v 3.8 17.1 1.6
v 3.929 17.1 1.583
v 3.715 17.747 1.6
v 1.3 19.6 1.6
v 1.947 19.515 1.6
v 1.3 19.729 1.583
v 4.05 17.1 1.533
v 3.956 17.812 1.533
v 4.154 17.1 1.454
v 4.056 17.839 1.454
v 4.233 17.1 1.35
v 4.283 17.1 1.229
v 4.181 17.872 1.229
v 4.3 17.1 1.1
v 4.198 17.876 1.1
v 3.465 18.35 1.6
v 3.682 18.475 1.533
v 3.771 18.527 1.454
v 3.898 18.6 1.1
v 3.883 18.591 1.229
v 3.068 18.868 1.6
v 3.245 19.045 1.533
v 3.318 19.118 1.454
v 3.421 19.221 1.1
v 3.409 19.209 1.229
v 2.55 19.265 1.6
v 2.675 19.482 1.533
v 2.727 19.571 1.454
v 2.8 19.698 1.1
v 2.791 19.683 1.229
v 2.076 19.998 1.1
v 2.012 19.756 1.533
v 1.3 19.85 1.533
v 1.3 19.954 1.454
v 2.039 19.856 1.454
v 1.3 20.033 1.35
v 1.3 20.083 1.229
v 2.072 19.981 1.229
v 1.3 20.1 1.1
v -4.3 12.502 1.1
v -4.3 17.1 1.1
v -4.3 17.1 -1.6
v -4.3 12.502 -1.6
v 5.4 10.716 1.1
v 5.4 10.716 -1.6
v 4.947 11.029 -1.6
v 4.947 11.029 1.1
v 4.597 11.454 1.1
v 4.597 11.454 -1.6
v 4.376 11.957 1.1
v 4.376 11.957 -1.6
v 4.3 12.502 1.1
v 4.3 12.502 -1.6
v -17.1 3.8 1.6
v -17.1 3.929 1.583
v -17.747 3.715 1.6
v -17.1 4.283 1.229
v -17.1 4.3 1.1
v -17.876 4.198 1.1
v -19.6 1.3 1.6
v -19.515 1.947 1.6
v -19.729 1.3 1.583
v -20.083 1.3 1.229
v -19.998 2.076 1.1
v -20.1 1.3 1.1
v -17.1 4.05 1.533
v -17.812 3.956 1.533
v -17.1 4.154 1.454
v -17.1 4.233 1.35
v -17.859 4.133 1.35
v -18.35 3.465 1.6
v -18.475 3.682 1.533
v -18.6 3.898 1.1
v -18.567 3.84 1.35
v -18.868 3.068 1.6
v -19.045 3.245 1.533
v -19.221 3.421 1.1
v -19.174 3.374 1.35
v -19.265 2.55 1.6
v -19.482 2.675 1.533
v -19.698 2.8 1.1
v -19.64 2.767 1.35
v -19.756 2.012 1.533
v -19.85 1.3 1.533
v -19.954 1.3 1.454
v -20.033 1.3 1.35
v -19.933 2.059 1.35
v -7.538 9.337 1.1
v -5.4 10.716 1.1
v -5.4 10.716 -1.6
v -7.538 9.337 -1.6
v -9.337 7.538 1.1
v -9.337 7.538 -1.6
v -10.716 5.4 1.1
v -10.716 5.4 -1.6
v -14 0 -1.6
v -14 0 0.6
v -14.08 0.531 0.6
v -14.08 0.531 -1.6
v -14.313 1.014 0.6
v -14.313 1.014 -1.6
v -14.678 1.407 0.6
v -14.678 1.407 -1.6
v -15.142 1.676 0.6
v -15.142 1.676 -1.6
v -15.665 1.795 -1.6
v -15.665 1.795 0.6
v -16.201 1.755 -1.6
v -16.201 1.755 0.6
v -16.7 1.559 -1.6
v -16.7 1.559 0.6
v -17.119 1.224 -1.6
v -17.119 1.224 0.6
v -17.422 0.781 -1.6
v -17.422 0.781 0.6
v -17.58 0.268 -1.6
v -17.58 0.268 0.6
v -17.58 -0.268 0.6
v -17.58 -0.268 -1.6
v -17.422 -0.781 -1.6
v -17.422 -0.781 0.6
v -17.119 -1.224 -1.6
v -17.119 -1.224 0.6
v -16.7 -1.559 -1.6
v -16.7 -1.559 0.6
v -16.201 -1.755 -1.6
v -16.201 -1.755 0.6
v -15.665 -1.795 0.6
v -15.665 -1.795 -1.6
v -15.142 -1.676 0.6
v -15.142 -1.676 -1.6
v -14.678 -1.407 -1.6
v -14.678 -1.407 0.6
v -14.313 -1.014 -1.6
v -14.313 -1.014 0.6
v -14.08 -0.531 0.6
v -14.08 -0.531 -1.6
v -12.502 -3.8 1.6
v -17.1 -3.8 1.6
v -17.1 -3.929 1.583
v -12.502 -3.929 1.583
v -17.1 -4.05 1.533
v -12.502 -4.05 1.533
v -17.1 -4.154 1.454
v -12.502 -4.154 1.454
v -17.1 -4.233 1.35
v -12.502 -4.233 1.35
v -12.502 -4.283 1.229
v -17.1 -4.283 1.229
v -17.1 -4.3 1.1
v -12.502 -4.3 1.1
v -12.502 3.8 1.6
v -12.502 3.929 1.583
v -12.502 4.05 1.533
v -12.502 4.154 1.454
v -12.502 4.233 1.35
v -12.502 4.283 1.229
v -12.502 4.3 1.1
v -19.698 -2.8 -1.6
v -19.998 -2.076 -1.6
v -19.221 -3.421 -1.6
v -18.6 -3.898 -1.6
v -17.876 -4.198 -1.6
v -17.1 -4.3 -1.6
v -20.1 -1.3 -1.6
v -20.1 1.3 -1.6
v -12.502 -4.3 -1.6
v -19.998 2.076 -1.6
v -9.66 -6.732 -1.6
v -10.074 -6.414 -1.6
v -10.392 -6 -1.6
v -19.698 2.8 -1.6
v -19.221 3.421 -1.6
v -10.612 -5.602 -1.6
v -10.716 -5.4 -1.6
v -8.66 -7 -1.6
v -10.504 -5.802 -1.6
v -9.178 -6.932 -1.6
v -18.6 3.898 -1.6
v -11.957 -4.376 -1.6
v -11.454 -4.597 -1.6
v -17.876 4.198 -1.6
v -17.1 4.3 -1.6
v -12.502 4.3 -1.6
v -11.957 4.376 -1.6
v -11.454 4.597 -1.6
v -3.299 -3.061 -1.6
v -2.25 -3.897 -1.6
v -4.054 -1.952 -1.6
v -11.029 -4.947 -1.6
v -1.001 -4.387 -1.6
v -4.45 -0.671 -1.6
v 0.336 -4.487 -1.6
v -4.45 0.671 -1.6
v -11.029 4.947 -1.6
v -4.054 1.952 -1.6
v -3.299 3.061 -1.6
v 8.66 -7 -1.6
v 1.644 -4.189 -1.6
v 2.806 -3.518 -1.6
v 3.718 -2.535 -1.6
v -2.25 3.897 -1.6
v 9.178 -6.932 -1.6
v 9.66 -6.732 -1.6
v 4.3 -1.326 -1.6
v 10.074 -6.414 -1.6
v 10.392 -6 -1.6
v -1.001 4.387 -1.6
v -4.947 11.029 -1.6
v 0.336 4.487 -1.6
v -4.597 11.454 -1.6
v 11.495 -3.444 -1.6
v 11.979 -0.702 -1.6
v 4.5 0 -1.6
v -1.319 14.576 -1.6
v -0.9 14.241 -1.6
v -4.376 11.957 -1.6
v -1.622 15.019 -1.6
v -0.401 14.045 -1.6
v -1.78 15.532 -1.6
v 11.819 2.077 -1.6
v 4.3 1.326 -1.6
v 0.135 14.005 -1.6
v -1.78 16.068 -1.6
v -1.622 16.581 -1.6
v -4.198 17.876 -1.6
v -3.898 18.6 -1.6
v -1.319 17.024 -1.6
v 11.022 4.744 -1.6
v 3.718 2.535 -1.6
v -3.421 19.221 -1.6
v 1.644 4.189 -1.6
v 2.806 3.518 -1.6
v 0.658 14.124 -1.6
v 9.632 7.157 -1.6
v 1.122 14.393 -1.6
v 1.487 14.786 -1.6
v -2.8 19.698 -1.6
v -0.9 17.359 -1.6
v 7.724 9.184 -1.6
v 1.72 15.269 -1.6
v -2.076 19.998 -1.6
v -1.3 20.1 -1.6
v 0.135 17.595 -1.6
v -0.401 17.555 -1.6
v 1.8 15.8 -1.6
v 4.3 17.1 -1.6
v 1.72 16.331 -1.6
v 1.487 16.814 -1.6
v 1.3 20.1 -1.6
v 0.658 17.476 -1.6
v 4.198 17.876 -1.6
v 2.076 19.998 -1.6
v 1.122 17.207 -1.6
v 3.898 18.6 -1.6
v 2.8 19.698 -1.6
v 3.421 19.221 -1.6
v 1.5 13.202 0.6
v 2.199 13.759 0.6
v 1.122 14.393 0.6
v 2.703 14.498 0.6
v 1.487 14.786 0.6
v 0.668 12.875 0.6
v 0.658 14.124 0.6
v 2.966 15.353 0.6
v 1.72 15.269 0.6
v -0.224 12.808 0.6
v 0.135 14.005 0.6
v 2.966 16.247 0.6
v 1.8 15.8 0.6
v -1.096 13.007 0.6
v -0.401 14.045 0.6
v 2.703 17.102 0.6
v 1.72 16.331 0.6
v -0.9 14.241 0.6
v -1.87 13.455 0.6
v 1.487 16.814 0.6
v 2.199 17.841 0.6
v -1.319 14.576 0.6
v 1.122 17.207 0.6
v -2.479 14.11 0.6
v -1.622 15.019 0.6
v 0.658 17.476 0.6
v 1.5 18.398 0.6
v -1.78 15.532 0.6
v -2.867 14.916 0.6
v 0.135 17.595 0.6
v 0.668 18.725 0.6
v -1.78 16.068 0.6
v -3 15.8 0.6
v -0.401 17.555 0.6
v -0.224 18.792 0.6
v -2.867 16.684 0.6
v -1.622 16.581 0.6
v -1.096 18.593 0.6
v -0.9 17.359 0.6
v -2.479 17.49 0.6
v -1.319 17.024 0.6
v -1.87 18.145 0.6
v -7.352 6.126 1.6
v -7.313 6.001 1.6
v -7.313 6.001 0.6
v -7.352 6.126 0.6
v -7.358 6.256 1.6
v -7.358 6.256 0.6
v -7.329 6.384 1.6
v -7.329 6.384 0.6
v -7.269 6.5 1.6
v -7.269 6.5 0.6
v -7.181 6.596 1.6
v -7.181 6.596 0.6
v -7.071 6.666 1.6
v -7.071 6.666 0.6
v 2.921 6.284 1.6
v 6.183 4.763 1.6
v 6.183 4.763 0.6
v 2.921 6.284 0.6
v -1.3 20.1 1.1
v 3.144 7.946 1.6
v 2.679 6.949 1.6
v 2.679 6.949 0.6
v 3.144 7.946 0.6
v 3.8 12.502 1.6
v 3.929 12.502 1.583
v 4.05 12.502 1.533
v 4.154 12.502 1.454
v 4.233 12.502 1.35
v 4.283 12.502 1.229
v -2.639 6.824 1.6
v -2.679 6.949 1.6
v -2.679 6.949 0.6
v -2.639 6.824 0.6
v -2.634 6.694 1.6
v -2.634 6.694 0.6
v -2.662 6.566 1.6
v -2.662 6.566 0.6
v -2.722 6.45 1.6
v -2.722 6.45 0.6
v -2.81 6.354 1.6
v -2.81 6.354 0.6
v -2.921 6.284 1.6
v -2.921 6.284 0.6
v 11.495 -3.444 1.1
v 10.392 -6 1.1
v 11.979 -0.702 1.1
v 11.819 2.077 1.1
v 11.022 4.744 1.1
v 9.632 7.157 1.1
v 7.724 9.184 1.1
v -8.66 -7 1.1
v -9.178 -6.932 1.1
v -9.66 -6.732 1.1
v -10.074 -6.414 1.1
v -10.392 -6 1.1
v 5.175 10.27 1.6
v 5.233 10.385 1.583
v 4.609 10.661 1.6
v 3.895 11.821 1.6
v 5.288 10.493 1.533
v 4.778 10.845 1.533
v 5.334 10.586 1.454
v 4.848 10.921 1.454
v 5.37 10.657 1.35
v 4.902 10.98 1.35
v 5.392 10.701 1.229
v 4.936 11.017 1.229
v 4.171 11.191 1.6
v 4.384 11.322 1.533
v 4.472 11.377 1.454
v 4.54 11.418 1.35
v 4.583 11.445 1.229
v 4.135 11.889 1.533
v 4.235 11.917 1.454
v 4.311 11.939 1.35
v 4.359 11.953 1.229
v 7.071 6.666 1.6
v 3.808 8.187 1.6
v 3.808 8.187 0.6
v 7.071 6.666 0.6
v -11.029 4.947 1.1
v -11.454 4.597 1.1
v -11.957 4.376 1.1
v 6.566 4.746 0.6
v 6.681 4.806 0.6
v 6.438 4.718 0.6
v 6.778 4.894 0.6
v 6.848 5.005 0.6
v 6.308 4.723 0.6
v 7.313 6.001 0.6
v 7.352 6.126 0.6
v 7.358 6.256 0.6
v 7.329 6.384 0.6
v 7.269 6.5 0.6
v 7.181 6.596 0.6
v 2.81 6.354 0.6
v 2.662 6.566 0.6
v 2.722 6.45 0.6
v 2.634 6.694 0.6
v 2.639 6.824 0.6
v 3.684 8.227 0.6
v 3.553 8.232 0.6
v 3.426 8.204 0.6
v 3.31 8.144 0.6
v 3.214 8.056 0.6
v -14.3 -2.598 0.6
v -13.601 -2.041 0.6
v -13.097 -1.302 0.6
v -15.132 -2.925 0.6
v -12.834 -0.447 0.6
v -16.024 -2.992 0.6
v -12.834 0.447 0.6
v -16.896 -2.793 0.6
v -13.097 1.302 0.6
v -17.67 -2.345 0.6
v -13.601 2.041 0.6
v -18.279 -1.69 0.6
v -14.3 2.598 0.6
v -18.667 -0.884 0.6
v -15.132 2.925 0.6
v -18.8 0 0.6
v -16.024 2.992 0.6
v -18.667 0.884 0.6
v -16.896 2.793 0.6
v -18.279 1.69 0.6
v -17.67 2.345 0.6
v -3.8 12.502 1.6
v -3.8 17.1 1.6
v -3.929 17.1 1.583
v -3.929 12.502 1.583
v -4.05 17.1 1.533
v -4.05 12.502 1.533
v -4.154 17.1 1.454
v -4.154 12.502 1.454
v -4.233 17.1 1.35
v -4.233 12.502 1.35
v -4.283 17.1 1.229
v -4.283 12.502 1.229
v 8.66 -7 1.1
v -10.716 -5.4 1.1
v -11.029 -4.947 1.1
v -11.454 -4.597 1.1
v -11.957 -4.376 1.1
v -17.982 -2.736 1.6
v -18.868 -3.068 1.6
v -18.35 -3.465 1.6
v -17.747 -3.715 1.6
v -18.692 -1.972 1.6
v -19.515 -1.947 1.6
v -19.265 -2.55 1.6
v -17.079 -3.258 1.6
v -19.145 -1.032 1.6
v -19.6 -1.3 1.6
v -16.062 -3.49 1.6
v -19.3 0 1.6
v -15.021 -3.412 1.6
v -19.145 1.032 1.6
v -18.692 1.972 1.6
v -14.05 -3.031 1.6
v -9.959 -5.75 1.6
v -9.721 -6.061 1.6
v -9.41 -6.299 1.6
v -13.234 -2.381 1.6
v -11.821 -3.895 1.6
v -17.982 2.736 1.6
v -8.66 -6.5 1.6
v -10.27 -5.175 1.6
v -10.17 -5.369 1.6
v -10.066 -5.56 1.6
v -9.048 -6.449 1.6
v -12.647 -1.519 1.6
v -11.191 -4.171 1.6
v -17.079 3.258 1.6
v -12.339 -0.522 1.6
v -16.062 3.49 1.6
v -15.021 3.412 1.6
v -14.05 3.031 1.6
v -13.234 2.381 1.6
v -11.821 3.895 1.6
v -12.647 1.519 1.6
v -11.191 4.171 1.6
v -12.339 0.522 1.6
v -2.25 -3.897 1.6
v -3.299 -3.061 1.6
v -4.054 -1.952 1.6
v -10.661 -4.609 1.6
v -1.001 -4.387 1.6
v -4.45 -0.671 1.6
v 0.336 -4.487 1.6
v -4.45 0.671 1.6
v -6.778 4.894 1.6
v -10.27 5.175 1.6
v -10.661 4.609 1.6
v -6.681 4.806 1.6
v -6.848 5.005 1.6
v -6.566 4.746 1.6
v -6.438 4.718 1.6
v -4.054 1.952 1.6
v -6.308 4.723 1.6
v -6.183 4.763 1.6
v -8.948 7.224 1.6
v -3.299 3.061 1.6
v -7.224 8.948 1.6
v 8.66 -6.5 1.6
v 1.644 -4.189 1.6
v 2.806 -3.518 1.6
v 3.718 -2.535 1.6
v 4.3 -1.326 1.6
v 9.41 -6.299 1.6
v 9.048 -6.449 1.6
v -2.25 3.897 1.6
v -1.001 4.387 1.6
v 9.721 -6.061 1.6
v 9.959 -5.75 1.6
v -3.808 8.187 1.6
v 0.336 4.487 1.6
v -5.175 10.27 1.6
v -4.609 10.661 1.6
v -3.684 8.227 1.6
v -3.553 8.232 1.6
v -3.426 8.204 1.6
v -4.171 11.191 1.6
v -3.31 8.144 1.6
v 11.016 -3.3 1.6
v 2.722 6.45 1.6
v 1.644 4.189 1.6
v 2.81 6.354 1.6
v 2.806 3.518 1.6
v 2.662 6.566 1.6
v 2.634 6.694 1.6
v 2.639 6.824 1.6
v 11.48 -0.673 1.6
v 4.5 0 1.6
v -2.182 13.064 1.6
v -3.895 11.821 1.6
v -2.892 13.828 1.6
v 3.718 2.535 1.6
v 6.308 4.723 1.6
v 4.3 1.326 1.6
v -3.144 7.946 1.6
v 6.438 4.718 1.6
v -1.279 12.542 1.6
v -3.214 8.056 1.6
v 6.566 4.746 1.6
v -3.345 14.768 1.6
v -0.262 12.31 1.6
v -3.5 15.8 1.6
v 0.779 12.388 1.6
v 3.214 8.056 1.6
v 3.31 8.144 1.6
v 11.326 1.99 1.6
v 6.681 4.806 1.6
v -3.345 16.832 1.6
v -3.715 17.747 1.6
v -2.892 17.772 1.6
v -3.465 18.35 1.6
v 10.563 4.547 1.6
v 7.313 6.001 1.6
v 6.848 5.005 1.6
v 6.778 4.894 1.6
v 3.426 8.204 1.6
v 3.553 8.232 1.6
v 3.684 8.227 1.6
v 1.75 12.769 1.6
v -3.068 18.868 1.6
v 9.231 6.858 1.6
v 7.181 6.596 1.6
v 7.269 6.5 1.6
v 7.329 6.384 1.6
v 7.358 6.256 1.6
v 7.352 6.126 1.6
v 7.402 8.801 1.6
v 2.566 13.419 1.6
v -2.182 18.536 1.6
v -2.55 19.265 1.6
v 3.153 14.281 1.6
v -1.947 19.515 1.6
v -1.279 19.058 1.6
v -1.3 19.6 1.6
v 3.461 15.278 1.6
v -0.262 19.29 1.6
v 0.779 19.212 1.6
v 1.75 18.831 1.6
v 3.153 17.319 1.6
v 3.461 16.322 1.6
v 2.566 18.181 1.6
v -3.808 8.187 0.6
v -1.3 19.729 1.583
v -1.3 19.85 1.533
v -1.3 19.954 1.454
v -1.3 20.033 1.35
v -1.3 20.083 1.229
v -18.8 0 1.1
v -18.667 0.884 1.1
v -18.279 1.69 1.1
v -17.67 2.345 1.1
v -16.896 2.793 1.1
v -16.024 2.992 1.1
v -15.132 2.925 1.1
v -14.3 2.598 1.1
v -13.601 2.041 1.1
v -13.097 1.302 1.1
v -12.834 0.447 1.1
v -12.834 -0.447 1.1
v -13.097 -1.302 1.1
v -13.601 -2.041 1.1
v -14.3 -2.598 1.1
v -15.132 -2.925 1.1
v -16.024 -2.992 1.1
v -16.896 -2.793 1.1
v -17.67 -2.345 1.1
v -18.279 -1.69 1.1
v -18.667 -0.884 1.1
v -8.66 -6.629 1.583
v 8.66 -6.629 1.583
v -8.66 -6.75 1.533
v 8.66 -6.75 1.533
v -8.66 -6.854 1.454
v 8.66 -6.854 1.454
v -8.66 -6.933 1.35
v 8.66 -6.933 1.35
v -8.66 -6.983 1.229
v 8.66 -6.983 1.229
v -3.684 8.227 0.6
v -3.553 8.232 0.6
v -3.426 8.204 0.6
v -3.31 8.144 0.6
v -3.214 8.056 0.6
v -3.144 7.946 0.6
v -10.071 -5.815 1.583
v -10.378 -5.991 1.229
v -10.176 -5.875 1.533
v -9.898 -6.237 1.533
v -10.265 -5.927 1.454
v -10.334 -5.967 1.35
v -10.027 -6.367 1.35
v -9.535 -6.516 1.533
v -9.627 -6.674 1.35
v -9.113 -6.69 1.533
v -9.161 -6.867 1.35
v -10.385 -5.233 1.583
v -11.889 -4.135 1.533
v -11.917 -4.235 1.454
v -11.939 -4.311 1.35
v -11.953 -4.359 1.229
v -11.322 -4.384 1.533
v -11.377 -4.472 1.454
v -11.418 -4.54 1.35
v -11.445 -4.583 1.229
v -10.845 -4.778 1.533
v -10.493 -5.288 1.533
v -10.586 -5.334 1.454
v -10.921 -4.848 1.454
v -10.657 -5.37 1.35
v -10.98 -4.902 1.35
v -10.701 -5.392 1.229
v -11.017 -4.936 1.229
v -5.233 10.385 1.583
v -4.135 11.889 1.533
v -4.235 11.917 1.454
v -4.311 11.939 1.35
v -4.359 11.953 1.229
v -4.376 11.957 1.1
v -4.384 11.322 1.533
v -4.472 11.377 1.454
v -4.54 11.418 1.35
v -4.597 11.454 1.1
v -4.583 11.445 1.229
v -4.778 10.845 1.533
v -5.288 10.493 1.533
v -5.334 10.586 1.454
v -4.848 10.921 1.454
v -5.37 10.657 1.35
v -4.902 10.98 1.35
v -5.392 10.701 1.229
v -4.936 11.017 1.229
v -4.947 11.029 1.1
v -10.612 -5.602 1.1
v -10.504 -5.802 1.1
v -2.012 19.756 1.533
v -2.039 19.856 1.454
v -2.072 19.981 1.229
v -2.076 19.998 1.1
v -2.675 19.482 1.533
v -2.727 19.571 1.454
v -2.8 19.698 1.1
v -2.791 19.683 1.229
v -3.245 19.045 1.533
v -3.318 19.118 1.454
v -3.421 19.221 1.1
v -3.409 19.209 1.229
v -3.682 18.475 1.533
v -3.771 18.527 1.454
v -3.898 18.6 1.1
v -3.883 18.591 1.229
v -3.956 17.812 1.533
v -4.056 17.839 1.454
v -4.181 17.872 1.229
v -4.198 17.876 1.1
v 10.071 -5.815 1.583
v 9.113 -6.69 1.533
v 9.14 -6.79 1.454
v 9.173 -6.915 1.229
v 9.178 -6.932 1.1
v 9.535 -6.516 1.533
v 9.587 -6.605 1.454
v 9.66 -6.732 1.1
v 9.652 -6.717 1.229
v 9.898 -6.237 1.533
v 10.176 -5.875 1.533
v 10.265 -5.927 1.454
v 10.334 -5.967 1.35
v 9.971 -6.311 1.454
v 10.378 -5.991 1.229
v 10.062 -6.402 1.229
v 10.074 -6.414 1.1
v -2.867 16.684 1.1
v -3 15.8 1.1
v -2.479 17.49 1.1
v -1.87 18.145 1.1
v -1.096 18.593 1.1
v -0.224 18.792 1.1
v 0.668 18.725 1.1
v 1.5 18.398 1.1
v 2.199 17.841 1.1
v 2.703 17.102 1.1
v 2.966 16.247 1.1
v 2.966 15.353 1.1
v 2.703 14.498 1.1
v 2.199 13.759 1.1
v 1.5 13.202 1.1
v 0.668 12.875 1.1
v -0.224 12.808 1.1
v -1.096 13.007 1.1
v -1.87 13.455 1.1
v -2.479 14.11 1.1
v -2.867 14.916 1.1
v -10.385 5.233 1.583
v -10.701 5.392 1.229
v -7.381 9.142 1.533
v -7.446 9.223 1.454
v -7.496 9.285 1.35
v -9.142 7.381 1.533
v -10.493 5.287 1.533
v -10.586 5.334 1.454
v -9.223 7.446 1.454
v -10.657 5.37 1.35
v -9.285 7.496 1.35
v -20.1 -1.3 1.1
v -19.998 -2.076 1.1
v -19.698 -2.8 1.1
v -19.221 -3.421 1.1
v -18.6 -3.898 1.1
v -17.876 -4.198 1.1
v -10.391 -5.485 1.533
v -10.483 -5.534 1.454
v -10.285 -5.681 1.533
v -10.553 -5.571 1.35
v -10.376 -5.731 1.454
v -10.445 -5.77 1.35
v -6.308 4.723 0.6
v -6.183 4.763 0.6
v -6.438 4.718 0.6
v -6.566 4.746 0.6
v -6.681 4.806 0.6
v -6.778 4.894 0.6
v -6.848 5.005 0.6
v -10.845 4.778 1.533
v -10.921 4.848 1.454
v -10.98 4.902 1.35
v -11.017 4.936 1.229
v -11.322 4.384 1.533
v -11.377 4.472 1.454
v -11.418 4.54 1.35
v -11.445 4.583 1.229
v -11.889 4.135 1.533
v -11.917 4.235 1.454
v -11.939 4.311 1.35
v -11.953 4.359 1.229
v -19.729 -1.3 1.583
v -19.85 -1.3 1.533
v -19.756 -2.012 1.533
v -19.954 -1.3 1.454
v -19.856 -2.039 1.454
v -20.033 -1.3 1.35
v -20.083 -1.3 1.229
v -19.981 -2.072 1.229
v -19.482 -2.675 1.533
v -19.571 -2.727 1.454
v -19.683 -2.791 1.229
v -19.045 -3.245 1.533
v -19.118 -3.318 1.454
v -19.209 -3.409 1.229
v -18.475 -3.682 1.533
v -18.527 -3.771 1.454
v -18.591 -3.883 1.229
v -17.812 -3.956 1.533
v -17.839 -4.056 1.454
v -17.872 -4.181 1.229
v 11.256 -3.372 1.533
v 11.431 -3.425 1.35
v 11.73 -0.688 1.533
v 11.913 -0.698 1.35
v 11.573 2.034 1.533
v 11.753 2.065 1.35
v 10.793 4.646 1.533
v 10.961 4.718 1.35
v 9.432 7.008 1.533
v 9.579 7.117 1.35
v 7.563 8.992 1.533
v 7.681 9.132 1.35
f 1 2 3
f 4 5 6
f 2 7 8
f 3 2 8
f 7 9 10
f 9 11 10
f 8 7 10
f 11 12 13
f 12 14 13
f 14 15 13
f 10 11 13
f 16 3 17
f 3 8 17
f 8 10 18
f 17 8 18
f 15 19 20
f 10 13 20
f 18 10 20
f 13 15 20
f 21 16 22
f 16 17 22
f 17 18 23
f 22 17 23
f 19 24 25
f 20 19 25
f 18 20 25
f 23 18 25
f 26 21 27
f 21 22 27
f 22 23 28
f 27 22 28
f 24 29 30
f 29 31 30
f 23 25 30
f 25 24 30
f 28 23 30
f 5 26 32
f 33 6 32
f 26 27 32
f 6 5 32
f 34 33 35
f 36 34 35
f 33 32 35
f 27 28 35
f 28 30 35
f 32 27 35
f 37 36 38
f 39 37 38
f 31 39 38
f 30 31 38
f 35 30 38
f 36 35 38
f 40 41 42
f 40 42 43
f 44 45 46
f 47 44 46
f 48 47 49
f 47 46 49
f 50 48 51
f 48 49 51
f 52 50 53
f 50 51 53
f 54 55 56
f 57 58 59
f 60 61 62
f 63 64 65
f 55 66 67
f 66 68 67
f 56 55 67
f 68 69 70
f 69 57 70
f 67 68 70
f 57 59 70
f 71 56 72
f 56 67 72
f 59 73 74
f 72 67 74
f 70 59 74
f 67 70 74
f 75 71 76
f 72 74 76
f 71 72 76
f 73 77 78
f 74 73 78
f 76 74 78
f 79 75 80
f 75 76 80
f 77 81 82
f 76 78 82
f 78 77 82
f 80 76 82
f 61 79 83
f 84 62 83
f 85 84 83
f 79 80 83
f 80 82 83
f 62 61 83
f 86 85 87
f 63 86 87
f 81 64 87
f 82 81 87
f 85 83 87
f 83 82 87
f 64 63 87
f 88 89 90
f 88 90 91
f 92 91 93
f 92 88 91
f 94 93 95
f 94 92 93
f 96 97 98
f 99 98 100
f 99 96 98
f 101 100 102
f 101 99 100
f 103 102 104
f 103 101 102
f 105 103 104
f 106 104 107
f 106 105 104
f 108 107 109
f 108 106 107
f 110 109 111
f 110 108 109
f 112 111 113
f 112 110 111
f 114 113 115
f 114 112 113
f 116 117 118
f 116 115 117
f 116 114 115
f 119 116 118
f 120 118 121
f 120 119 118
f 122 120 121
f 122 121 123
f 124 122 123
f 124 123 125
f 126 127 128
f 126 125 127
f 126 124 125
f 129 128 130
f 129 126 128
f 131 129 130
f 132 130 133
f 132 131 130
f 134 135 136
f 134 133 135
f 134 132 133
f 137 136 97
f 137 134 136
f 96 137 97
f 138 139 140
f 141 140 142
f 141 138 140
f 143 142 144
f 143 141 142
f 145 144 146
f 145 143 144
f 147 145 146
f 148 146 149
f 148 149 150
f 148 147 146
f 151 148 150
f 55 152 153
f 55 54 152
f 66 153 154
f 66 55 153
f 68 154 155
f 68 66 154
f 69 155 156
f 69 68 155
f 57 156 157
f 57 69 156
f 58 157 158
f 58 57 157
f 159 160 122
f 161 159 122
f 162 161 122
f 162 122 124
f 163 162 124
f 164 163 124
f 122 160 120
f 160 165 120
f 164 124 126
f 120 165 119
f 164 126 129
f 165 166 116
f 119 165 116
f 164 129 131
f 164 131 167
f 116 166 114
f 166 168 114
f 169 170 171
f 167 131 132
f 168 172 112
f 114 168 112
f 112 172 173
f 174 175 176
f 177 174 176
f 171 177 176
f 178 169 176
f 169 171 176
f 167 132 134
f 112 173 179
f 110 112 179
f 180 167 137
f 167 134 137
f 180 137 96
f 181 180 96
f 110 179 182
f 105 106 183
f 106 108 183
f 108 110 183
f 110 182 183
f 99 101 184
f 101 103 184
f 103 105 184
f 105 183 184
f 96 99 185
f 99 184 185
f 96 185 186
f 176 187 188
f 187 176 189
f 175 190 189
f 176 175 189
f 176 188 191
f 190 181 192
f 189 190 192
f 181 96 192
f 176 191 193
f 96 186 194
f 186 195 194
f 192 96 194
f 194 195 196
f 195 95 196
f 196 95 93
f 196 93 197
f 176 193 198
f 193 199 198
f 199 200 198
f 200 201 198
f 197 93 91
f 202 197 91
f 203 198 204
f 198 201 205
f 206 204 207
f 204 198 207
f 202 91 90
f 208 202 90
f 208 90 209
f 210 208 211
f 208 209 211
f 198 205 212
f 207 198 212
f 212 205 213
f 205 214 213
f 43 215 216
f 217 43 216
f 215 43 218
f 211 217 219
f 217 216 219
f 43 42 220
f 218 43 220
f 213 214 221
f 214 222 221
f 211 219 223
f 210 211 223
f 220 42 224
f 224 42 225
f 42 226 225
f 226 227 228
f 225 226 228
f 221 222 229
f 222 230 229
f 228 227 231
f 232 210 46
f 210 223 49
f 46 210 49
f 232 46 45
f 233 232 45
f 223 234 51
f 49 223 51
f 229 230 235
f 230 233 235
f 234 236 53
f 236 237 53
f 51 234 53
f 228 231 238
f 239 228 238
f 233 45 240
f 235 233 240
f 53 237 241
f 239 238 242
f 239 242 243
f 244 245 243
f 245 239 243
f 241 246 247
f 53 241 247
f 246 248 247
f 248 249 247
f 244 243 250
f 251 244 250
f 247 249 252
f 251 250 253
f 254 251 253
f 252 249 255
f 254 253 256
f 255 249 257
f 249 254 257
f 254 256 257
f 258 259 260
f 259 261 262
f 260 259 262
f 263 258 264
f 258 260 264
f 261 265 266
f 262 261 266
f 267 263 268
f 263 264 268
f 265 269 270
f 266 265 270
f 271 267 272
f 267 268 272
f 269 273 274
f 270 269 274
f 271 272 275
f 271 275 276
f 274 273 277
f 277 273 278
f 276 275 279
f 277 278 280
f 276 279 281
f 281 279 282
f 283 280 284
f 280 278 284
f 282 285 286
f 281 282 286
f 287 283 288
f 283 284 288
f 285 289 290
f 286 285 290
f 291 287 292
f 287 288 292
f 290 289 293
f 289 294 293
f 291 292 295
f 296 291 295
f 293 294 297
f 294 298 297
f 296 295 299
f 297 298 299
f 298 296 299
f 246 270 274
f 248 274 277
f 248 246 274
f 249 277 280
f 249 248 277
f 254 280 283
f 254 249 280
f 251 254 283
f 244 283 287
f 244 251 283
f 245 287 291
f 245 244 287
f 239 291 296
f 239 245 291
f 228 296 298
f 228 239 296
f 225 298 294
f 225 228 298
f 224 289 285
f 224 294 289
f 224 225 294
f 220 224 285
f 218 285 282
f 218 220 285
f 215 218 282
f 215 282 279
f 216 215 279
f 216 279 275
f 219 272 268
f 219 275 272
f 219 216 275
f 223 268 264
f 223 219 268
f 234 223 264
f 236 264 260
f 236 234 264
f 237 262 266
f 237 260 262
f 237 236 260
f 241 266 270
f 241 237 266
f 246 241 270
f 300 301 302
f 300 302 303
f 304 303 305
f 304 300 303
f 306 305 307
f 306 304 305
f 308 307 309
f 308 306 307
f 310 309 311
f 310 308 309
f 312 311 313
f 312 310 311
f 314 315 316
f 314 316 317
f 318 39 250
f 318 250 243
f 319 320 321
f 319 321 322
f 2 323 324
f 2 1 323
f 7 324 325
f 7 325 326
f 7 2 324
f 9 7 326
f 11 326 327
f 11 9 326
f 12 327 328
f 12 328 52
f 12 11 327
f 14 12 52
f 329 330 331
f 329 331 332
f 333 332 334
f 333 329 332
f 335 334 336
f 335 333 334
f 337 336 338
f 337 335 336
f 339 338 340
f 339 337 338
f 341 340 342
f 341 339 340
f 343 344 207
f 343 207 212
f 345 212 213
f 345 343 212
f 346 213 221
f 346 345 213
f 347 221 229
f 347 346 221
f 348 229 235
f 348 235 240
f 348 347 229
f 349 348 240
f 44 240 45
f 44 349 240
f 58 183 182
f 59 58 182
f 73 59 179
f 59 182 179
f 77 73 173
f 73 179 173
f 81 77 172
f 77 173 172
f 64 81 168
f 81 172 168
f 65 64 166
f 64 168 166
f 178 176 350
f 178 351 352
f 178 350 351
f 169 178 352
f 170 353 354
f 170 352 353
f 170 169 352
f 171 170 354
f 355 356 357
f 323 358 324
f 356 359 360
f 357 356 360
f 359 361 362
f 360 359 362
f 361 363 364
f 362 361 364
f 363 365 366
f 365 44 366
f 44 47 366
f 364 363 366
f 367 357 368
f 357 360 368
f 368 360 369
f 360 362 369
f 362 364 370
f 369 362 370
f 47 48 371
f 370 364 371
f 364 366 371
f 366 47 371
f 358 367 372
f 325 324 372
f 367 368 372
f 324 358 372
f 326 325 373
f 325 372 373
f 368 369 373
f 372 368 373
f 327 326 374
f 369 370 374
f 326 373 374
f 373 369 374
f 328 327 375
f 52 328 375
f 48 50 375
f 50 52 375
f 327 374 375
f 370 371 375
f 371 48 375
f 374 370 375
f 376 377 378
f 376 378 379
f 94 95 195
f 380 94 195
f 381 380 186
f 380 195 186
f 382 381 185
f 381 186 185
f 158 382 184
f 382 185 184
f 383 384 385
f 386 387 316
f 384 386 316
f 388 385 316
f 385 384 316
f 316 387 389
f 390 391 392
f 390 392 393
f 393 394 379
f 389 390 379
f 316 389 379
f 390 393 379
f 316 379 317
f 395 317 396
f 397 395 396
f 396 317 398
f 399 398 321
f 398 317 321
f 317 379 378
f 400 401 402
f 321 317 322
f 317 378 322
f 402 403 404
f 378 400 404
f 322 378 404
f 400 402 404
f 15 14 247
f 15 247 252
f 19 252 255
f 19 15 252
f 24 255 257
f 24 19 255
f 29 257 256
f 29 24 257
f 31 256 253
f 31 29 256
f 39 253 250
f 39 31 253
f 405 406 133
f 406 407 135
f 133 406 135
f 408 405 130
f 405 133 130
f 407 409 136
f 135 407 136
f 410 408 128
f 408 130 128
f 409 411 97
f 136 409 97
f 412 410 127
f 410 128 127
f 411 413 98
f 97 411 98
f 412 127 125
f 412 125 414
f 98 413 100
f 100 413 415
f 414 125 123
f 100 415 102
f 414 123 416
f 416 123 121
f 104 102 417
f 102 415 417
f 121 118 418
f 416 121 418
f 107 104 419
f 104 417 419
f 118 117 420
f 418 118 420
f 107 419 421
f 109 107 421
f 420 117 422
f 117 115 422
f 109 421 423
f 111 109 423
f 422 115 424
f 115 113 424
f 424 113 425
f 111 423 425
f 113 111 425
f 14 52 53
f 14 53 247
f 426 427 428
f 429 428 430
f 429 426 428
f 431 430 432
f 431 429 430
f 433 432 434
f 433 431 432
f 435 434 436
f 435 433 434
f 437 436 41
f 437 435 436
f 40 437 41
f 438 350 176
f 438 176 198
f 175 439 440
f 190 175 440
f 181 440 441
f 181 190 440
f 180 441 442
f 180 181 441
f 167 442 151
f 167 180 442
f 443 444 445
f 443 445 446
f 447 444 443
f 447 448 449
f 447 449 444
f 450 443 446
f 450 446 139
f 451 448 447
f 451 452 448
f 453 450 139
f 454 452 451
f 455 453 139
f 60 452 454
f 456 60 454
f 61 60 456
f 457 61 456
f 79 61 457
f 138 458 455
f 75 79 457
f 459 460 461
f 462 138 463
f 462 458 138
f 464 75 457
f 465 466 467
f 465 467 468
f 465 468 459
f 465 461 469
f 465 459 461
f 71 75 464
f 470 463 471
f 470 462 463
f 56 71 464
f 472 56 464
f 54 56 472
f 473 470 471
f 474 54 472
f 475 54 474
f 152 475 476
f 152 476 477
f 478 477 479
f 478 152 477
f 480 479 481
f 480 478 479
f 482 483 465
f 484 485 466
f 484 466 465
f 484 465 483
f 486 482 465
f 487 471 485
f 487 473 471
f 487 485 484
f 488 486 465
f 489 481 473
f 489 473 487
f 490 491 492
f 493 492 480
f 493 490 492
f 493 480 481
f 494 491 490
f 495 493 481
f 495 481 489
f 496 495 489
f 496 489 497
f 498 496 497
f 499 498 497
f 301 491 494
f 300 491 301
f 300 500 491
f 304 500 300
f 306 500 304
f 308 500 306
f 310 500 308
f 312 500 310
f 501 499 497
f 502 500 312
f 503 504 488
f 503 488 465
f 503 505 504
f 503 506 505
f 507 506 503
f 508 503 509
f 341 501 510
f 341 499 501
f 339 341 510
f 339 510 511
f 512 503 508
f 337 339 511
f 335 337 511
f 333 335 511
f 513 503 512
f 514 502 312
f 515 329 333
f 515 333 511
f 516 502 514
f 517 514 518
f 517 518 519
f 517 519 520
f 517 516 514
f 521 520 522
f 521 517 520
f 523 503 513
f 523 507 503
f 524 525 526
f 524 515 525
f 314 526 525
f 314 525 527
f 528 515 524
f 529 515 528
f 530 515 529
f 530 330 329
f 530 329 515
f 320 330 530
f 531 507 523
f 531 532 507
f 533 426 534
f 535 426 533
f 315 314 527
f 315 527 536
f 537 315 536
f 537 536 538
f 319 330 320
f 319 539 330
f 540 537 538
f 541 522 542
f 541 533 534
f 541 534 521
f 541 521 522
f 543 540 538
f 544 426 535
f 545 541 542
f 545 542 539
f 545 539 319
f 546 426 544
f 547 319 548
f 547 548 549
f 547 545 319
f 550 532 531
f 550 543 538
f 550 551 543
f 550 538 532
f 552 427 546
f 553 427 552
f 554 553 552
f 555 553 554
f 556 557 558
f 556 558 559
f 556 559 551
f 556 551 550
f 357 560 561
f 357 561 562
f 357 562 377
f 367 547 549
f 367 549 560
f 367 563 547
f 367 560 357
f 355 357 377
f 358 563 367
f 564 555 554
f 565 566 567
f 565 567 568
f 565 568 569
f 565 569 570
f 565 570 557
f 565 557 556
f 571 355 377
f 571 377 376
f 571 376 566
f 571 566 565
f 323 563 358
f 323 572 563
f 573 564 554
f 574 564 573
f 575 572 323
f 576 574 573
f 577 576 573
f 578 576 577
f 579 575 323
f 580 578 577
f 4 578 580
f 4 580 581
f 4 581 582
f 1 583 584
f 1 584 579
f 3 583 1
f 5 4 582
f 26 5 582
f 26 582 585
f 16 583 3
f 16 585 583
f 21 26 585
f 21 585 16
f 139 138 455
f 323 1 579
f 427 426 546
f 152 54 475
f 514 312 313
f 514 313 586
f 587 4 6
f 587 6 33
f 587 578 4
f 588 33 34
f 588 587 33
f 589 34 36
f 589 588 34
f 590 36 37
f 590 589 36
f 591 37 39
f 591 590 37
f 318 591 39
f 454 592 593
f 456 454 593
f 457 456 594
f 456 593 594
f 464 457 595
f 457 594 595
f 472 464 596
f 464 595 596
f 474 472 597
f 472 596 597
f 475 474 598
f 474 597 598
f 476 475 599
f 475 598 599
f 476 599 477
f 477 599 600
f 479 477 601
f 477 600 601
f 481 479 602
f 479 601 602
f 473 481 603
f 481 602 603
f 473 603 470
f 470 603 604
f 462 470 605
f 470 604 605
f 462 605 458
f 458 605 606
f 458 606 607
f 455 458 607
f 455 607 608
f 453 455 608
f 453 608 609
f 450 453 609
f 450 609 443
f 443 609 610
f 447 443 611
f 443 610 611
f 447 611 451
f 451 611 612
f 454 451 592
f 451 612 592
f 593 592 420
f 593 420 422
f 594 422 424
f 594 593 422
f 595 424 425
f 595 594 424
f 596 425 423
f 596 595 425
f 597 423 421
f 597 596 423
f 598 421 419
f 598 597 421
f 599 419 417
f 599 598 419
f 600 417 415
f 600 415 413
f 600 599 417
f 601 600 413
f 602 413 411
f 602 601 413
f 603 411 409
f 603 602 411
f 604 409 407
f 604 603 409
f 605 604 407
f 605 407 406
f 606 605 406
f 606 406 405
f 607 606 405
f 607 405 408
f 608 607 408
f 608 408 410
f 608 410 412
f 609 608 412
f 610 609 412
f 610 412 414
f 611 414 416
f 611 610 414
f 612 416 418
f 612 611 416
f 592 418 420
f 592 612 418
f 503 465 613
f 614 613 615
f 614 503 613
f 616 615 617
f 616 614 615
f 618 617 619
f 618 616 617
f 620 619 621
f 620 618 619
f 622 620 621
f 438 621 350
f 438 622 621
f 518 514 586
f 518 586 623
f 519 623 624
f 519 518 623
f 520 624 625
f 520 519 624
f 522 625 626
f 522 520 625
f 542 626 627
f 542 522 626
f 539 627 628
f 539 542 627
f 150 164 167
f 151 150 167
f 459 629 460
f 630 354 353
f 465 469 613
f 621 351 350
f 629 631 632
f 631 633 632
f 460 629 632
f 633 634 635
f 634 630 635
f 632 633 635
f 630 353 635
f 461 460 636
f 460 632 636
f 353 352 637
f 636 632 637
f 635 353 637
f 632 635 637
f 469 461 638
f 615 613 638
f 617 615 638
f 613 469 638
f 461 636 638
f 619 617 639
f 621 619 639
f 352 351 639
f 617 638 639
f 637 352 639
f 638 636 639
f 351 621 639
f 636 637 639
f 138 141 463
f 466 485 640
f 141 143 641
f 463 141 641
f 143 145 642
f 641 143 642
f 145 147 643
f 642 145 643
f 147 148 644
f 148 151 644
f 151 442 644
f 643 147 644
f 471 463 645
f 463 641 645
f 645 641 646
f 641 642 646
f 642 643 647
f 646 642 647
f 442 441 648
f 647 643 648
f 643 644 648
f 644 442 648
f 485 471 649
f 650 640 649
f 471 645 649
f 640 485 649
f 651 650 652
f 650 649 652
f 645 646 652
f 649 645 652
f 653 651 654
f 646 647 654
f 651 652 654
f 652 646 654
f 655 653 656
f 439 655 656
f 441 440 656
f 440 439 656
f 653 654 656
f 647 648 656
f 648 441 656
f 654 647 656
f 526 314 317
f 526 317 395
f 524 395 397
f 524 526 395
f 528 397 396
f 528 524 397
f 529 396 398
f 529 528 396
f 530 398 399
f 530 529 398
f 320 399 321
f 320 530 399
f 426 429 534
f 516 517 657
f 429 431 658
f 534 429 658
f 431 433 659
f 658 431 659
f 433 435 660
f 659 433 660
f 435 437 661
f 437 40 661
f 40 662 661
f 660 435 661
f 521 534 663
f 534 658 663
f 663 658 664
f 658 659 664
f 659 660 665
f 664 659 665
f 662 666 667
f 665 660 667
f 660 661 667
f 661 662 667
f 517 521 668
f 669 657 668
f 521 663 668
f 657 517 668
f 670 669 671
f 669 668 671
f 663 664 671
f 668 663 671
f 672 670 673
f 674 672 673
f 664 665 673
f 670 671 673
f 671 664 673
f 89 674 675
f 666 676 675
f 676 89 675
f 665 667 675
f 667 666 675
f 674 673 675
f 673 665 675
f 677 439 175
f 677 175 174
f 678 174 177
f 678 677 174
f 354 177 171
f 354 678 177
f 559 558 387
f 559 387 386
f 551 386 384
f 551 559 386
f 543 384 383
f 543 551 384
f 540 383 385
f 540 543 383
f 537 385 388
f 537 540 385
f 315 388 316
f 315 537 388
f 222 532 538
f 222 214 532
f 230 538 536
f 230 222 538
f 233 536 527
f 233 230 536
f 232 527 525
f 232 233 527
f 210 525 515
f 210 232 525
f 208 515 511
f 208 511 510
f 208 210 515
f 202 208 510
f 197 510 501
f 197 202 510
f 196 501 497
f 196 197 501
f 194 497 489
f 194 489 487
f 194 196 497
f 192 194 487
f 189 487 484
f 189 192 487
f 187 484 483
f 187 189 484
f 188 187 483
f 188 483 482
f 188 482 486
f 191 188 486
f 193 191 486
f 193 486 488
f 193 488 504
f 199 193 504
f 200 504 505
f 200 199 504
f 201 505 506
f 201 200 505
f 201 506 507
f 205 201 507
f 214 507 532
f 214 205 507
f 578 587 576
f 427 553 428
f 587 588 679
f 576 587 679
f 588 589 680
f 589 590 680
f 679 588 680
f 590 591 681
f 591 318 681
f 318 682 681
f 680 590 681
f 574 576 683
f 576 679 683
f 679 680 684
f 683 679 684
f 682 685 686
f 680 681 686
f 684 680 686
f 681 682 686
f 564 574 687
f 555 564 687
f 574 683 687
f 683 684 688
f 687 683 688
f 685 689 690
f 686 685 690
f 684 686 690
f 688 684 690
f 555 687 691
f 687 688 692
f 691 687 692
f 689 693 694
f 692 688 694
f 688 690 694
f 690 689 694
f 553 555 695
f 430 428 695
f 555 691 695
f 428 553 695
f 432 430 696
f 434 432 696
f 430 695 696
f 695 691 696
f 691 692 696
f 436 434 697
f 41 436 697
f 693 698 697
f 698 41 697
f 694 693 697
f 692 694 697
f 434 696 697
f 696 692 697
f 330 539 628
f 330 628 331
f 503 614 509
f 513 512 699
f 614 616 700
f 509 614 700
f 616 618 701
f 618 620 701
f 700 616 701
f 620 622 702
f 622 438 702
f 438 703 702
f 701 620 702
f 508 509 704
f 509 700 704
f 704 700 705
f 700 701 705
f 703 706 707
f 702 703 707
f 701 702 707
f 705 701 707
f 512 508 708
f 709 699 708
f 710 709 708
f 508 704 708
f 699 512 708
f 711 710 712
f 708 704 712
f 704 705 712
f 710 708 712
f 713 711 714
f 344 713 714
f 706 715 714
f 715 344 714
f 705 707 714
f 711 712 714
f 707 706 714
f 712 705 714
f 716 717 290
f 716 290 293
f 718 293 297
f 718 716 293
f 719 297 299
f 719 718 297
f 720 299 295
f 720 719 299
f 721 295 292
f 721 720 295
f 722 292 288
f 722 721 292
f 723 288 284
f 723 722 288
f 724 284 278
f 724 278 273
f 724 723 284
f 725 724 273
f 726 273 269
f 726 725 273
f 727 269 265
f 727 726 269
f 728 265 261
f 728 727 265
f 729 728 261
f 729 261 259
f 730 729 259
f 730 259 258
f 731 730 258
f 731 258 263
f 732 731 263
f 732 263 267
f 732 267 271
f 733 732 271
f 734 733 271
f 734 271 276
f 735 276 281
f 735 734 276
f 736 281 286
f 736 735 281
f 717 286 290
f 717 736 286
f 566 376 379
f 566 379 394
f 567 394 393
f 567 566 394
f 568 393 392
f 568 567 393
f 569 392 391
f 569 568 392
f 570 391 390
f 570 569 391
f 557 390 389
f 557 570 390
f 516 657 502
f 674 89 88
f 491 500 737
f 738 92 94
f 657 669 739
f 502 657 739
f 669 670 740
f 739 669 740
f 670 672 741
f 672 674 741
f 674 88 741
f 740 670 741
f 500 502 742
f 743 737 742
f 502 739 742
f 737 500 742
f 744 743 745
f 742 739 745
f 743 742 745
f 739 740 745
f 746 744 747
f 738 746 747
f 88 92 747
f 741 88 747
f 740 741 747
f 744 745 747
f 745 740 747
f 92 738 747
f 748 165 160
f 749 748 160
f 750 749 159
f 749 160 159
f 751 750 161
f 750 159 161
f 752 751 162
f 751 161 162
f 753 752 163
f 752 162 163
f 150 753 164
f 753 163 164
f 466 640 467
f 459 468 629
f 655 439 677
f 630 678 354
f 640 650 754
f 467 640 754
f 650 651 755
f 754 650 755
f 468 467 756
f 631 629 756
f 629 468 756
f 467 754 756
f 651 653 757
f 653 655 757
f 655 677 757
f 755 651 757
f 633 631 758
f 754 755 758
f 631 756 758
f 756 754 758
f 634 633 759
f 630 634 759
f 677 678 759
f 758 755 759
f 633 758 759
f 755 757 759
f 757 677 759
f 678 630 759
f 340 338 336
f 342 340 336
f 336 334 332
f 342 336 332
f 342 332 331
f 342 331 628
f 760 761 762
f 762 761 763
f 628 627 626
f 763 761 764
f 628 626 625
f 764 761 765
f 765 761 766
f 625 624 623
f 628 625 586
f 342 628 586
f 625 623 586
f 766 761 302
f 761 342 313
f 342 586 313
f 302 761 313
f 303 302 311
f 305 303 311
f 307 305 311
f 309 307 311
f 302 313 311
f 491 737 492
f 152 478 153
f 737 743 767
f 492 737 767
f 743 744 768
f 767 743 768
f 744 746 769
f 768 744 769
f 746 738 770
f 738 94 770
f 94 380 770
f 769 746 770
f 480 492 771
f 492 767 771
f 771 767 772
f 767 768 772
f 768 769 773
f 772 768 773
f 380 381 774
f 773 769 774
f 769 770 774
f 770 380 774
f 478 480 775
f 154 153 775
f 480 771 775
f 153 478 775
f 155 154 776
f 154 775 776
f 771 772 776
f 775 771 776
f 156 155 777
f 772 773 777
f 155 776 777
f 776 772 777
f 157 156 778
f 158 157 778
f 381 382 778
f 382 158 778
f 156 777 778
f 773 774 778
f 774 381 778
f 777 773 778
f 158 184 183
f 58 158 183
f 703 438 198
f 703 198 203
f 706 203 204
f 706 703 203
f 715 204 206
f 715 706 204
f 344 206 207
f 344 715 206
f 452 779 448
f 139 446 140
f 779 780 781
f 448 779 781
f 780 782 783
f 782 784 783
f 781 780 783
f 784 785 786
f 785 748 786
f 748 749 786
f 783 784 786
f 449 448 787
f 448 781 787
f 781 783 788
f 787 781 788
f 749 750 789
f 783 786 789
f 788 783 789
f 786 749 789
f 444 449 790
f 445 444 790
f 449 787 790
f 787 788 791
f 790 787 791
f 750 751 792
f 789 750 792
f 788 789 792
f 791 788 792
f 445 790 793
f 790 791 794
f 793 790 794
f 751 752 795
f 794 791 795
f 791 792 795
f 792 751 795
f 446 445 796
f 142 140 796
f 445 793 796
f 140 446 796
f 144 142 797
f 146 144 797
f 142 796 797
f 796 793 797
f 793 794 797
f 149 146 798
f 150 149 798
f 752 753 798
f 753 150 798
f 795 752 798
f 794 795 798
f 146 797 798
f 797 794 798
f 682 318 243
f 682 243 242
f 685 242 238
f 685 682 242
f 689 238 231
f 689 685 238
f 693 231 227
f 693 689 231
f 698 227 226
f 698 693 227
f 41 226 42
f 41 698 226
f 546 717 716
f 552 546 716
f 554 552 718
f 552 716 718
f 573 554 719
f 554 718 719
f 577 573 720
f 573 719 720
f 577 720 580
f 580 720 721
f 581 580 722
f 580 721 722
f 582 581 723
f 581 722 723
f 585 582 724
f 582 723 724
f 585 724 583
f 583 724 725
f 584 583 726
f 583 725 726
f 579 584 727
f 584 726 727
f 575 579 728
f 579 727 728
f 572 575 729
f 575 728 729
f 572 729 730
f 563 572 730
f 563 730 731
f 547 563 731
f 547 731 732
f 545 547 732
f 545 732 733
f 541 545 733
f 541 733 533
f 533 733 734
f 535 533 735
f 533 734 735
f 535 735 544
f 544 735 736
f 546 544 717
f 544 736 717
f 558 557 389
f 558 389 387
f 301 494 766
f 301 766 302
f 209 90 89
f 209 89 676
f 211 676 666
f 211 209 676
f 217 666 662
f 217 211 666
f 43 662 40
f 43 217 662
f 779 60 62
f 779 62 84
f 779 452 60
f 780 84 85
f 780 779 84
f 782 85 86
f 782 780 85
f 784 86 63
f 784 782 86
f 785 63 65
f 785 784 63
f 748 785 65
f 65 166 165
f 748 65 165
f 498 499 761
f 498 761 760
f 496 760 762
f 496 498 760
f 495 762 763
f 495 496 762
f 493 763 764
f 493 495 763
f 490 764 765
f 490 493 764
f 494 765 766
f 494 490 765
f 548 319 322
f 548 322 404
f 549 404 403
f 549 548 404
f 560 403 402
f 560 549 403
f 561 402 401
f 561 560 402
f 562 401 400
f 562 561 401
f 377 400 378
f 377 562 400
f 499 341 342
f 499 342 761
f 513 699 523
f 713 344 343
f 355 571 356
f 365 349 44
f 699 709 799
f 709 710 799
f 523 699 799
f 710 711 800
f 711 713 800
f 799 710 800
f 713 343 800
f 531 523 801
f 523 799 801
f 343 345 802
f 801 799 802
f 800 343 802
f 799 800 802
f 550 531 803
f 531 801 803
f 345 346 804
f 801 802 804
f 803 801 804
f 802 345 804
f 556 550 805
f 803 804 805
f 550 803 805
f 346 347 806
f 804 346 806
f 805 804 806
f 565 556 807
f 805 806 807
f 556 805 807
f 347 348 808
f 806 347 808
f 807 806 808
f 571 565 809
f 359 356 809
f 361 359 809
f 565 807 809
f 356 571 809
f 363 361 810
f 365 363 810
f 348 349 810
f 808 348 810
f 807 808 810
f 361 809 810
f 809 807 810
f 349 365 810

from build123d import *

# Parameters (mm, degrees)
SKETCH10_R          = 4.5
BOSS_EXTRUDE6_DEPTH = 1.6
SKETCH13_R          = 1.8
BOSS_EXTRUDE7_DEPTH = 1.6
FILLET1_R           = 2
CUT_EXTRUDE2_DEPTH  = 1
SKETCH16_R          = 3
CUT_EXTRUDE3_DEPTH  = 1
CHAMFER1_SIZE       = 0.5
FILLET2_R           = 0.5


with BuildPart() as part:
    # Sketch10 → Boss-Extrude6 (new body, symmetric)
    with BuildSketch(Plane.XY):
        with BuildLine():
            Line((-9.746794345, -7), (9.746794345, -7))
            ThreePointArc((9.746794345, -7), (0, 12), (-9.746794345, -7))
        make_face()
        Circle(SKETCH10_R, mode=Mode.SUBTRACT)
    extrude(amount=BOSS_EXTRUDE6_DEPTH, both=True)

    # Sketch13 → Boss-Extrude7 (add, symmetric)
    with BuildSketch(Plane.XY):
        with BuildLine():
            Line((-11.203124564, 4.3), (-17.1, 4.3))
            ThreePointArc((-17.1, 4.3), (-19.221320344, 3.421320344), (-20.1, 1.3))
            Line((-20.1, 1.3), (-20.1, -1.3))
            ThreePointArc((-20.1, -1.3), (-19.221320344, -3.421320344), (-17.1, -4.3))
            Line((-17.1, -4.3), (-11.203124564, -4.3))
            ThreePointArc((-11.203124564, -4.3), (-12, 0), (-11.203124564, 4.3))
        make_face()
        with Locations((-15.8, 0)):
            Circle(SKETCH13_R, mode=Mode.SUBTRACT)
        with BuildLine():
            Line((4.3, 11.203124564), (4.3, 17.1))
            ThreePointArc((4.3, 17.1), (3.421320344, 19.221320344), (1.3, 20.1))
            Line((1.3, 20.1), (-1.3, 20.1))
            ThreePointArc((-1.3, 20.1), (-3.421320344, 19.221320344), (-4.3, 17.1))
            Line((-4.3, 17.1), (-4.3, 11.203124564))
            ThreePointArc((-4.3, 11.203124564), (0, 12), (4.3, 11.203124564))
        make_face()
        with Locations((0, 15.8)):
            Circle(SKETCH13_R, mode=Mode.SUBTRACT)
    extrude(amount=BOSS_EXTRUDE7_DEPTH, both=True)

    # Fillet1
    fillet1_edges = [part.edges().sort_by_distance(p)[0] for p in [
        (-11.203124564, -4.3, 0),
        (-11.203124564, 4.3, 0),
        (-4.3, 11.203124564, 0),
        (4.3, 11.203124564, 0),
        (9.746794345, -7, 0),
        (-9.746794345, -7, 0),
    ]]
    fillet(fillet1_edges, radius=FILLET1_R)

    # Sketch15 → Cut-Extrude2 (cut)
    with BuildSketch(Plane(origin=(0, 0, 1.6), x_dir=(-1, 0, 0), z_dir=(0, 0, -1))):
        with BuildLine():
            Line((-3.808047036, 8.187368684), (-7.070755069, 6.665942941))
            ThreePointArc((-7.070755069, 6.665942941), (-7.329292249, 6.38379912), (-7.312599832, 6.001479917))
            Line((-7.312599832, 6.001479917), (-6.847719744, 5.004541351))
            ThreePointArc((-6.847719744, 5.004541351), (-6.565575922, 4.746004172), (-6.18325672, 4.762696589))
            Line((-6.18325672, 4.762696589), (-2.920548686, 6.284122331))
            ThreePointArc((-2.920548686, 6.284122331), (-2.662011507, 6.566266153), (-2.678703924, 6.948585355))
            Line((-2.678703924, 6.948585355), (-3.143584012, 7.945523921))
            ThreePointArc((-3.143584012, 7.945523921), (-3.425727833, 8.204061101), (-3.808047036, 8.187368684))
        make_face()
        with BuildLine():
            Line((6.847719744, 5.004541351), (7.312599832, 6.001479917))
            ThreePointArc((7.312599832, 6.001479917), (7.329292249, 6.38379912), (7.070755069, 6.665942941))
            Line((7.070755069, 6.665942941), (3.808047036, 8.187368684))
            ThreePointArc((3.808047036, 8.187368684), (3.425727833, 8.204061101), (3.143584012, 7.945523921))
            Line((3.143584012, 7.945523921), (2.678703924, 6.948585355))
            ThreePointArc((2.678703924, 6.948585355), (2.662011507, 6.566266153), (2.920548686, 6.284122331))
            Line((2.920548686, 6.284122331), (6.18325672, 4.762696589))
            ThreePointArc((6.18325672, 4.762696589), (6.565575922, 4.746004172), (6.847719744, 5.004541351))
        make_face()
    extrude(amount=CUT_EXTRUDE2_DEPTH, mode=Mode.SUBTRACT)

    # Sketch16 → Cut-Extrude3 (cut)
    with BuildSketch(Plane(origin=(0, 0, 1.6), x_dir=(-1, 0, 0), z_dir=(0, 0, -1))):
        with Locations((0, 15.8)):
            Circle(SKETCH16_R)
        with Locations((15.8, 0)):
            Circle(SKETCH16_R)
    extrude(amount=CUT_EXTRUDE3_DEPTH, mode=Mode.SUBTRACT)

    # Chamfer1
    chamfer1_edges = [part.edges().sort_by_distance(p)[0] for p in [
        (3, 15.8, 1.6),
        (-12.8, 0, 1.6),
    ]]
    chamfer(chamfer1_edges, length=CHAMFER1_SIZE)

    # Fillet2
    fillet2_edges = [part.edges().sort_by_distance(p)[0] for p in [
        (-19.221320344, 3.421320344, 1.6),
        (-20.1, 0, 1.6),
        (-19.221320344, -3.421320344, 1.6),
        (-14.801199885, -4.3, 1.6),
        (3.421320344, 19.221320344, 1.6),
        (0, 20.1, 1.6),
        (-3.421320344, 19.221320344, 1.6),
        (-4.3, 14.801199885, 1.6),
        (-14.801199885, 4.3, 1.6),
        (-8.485281374, 8.485281374, 1.6),
        (4.3, 14.801199885, 1.6),
        (11.498184685, 3.433911609, 1.6),
        (-10.558586547, -5.702302178, 1.6),
        (0, -7, 1.6),
        (-9.660254038, -6.732050808, 1.6),
        (9.660254038, -6.732050808, 1.6),
        (-11.453590921, 4.597061363, 1.6),
        (4.597061363, 11.453590921, 1.6),
        (-4.597061363, 11.453590921, 1.6),
        (-11.453590921, -4.597061363, 1.6),
    ]]
    fillet(fillet2_edges, radius=FILLET2_R)


solid = part.part
